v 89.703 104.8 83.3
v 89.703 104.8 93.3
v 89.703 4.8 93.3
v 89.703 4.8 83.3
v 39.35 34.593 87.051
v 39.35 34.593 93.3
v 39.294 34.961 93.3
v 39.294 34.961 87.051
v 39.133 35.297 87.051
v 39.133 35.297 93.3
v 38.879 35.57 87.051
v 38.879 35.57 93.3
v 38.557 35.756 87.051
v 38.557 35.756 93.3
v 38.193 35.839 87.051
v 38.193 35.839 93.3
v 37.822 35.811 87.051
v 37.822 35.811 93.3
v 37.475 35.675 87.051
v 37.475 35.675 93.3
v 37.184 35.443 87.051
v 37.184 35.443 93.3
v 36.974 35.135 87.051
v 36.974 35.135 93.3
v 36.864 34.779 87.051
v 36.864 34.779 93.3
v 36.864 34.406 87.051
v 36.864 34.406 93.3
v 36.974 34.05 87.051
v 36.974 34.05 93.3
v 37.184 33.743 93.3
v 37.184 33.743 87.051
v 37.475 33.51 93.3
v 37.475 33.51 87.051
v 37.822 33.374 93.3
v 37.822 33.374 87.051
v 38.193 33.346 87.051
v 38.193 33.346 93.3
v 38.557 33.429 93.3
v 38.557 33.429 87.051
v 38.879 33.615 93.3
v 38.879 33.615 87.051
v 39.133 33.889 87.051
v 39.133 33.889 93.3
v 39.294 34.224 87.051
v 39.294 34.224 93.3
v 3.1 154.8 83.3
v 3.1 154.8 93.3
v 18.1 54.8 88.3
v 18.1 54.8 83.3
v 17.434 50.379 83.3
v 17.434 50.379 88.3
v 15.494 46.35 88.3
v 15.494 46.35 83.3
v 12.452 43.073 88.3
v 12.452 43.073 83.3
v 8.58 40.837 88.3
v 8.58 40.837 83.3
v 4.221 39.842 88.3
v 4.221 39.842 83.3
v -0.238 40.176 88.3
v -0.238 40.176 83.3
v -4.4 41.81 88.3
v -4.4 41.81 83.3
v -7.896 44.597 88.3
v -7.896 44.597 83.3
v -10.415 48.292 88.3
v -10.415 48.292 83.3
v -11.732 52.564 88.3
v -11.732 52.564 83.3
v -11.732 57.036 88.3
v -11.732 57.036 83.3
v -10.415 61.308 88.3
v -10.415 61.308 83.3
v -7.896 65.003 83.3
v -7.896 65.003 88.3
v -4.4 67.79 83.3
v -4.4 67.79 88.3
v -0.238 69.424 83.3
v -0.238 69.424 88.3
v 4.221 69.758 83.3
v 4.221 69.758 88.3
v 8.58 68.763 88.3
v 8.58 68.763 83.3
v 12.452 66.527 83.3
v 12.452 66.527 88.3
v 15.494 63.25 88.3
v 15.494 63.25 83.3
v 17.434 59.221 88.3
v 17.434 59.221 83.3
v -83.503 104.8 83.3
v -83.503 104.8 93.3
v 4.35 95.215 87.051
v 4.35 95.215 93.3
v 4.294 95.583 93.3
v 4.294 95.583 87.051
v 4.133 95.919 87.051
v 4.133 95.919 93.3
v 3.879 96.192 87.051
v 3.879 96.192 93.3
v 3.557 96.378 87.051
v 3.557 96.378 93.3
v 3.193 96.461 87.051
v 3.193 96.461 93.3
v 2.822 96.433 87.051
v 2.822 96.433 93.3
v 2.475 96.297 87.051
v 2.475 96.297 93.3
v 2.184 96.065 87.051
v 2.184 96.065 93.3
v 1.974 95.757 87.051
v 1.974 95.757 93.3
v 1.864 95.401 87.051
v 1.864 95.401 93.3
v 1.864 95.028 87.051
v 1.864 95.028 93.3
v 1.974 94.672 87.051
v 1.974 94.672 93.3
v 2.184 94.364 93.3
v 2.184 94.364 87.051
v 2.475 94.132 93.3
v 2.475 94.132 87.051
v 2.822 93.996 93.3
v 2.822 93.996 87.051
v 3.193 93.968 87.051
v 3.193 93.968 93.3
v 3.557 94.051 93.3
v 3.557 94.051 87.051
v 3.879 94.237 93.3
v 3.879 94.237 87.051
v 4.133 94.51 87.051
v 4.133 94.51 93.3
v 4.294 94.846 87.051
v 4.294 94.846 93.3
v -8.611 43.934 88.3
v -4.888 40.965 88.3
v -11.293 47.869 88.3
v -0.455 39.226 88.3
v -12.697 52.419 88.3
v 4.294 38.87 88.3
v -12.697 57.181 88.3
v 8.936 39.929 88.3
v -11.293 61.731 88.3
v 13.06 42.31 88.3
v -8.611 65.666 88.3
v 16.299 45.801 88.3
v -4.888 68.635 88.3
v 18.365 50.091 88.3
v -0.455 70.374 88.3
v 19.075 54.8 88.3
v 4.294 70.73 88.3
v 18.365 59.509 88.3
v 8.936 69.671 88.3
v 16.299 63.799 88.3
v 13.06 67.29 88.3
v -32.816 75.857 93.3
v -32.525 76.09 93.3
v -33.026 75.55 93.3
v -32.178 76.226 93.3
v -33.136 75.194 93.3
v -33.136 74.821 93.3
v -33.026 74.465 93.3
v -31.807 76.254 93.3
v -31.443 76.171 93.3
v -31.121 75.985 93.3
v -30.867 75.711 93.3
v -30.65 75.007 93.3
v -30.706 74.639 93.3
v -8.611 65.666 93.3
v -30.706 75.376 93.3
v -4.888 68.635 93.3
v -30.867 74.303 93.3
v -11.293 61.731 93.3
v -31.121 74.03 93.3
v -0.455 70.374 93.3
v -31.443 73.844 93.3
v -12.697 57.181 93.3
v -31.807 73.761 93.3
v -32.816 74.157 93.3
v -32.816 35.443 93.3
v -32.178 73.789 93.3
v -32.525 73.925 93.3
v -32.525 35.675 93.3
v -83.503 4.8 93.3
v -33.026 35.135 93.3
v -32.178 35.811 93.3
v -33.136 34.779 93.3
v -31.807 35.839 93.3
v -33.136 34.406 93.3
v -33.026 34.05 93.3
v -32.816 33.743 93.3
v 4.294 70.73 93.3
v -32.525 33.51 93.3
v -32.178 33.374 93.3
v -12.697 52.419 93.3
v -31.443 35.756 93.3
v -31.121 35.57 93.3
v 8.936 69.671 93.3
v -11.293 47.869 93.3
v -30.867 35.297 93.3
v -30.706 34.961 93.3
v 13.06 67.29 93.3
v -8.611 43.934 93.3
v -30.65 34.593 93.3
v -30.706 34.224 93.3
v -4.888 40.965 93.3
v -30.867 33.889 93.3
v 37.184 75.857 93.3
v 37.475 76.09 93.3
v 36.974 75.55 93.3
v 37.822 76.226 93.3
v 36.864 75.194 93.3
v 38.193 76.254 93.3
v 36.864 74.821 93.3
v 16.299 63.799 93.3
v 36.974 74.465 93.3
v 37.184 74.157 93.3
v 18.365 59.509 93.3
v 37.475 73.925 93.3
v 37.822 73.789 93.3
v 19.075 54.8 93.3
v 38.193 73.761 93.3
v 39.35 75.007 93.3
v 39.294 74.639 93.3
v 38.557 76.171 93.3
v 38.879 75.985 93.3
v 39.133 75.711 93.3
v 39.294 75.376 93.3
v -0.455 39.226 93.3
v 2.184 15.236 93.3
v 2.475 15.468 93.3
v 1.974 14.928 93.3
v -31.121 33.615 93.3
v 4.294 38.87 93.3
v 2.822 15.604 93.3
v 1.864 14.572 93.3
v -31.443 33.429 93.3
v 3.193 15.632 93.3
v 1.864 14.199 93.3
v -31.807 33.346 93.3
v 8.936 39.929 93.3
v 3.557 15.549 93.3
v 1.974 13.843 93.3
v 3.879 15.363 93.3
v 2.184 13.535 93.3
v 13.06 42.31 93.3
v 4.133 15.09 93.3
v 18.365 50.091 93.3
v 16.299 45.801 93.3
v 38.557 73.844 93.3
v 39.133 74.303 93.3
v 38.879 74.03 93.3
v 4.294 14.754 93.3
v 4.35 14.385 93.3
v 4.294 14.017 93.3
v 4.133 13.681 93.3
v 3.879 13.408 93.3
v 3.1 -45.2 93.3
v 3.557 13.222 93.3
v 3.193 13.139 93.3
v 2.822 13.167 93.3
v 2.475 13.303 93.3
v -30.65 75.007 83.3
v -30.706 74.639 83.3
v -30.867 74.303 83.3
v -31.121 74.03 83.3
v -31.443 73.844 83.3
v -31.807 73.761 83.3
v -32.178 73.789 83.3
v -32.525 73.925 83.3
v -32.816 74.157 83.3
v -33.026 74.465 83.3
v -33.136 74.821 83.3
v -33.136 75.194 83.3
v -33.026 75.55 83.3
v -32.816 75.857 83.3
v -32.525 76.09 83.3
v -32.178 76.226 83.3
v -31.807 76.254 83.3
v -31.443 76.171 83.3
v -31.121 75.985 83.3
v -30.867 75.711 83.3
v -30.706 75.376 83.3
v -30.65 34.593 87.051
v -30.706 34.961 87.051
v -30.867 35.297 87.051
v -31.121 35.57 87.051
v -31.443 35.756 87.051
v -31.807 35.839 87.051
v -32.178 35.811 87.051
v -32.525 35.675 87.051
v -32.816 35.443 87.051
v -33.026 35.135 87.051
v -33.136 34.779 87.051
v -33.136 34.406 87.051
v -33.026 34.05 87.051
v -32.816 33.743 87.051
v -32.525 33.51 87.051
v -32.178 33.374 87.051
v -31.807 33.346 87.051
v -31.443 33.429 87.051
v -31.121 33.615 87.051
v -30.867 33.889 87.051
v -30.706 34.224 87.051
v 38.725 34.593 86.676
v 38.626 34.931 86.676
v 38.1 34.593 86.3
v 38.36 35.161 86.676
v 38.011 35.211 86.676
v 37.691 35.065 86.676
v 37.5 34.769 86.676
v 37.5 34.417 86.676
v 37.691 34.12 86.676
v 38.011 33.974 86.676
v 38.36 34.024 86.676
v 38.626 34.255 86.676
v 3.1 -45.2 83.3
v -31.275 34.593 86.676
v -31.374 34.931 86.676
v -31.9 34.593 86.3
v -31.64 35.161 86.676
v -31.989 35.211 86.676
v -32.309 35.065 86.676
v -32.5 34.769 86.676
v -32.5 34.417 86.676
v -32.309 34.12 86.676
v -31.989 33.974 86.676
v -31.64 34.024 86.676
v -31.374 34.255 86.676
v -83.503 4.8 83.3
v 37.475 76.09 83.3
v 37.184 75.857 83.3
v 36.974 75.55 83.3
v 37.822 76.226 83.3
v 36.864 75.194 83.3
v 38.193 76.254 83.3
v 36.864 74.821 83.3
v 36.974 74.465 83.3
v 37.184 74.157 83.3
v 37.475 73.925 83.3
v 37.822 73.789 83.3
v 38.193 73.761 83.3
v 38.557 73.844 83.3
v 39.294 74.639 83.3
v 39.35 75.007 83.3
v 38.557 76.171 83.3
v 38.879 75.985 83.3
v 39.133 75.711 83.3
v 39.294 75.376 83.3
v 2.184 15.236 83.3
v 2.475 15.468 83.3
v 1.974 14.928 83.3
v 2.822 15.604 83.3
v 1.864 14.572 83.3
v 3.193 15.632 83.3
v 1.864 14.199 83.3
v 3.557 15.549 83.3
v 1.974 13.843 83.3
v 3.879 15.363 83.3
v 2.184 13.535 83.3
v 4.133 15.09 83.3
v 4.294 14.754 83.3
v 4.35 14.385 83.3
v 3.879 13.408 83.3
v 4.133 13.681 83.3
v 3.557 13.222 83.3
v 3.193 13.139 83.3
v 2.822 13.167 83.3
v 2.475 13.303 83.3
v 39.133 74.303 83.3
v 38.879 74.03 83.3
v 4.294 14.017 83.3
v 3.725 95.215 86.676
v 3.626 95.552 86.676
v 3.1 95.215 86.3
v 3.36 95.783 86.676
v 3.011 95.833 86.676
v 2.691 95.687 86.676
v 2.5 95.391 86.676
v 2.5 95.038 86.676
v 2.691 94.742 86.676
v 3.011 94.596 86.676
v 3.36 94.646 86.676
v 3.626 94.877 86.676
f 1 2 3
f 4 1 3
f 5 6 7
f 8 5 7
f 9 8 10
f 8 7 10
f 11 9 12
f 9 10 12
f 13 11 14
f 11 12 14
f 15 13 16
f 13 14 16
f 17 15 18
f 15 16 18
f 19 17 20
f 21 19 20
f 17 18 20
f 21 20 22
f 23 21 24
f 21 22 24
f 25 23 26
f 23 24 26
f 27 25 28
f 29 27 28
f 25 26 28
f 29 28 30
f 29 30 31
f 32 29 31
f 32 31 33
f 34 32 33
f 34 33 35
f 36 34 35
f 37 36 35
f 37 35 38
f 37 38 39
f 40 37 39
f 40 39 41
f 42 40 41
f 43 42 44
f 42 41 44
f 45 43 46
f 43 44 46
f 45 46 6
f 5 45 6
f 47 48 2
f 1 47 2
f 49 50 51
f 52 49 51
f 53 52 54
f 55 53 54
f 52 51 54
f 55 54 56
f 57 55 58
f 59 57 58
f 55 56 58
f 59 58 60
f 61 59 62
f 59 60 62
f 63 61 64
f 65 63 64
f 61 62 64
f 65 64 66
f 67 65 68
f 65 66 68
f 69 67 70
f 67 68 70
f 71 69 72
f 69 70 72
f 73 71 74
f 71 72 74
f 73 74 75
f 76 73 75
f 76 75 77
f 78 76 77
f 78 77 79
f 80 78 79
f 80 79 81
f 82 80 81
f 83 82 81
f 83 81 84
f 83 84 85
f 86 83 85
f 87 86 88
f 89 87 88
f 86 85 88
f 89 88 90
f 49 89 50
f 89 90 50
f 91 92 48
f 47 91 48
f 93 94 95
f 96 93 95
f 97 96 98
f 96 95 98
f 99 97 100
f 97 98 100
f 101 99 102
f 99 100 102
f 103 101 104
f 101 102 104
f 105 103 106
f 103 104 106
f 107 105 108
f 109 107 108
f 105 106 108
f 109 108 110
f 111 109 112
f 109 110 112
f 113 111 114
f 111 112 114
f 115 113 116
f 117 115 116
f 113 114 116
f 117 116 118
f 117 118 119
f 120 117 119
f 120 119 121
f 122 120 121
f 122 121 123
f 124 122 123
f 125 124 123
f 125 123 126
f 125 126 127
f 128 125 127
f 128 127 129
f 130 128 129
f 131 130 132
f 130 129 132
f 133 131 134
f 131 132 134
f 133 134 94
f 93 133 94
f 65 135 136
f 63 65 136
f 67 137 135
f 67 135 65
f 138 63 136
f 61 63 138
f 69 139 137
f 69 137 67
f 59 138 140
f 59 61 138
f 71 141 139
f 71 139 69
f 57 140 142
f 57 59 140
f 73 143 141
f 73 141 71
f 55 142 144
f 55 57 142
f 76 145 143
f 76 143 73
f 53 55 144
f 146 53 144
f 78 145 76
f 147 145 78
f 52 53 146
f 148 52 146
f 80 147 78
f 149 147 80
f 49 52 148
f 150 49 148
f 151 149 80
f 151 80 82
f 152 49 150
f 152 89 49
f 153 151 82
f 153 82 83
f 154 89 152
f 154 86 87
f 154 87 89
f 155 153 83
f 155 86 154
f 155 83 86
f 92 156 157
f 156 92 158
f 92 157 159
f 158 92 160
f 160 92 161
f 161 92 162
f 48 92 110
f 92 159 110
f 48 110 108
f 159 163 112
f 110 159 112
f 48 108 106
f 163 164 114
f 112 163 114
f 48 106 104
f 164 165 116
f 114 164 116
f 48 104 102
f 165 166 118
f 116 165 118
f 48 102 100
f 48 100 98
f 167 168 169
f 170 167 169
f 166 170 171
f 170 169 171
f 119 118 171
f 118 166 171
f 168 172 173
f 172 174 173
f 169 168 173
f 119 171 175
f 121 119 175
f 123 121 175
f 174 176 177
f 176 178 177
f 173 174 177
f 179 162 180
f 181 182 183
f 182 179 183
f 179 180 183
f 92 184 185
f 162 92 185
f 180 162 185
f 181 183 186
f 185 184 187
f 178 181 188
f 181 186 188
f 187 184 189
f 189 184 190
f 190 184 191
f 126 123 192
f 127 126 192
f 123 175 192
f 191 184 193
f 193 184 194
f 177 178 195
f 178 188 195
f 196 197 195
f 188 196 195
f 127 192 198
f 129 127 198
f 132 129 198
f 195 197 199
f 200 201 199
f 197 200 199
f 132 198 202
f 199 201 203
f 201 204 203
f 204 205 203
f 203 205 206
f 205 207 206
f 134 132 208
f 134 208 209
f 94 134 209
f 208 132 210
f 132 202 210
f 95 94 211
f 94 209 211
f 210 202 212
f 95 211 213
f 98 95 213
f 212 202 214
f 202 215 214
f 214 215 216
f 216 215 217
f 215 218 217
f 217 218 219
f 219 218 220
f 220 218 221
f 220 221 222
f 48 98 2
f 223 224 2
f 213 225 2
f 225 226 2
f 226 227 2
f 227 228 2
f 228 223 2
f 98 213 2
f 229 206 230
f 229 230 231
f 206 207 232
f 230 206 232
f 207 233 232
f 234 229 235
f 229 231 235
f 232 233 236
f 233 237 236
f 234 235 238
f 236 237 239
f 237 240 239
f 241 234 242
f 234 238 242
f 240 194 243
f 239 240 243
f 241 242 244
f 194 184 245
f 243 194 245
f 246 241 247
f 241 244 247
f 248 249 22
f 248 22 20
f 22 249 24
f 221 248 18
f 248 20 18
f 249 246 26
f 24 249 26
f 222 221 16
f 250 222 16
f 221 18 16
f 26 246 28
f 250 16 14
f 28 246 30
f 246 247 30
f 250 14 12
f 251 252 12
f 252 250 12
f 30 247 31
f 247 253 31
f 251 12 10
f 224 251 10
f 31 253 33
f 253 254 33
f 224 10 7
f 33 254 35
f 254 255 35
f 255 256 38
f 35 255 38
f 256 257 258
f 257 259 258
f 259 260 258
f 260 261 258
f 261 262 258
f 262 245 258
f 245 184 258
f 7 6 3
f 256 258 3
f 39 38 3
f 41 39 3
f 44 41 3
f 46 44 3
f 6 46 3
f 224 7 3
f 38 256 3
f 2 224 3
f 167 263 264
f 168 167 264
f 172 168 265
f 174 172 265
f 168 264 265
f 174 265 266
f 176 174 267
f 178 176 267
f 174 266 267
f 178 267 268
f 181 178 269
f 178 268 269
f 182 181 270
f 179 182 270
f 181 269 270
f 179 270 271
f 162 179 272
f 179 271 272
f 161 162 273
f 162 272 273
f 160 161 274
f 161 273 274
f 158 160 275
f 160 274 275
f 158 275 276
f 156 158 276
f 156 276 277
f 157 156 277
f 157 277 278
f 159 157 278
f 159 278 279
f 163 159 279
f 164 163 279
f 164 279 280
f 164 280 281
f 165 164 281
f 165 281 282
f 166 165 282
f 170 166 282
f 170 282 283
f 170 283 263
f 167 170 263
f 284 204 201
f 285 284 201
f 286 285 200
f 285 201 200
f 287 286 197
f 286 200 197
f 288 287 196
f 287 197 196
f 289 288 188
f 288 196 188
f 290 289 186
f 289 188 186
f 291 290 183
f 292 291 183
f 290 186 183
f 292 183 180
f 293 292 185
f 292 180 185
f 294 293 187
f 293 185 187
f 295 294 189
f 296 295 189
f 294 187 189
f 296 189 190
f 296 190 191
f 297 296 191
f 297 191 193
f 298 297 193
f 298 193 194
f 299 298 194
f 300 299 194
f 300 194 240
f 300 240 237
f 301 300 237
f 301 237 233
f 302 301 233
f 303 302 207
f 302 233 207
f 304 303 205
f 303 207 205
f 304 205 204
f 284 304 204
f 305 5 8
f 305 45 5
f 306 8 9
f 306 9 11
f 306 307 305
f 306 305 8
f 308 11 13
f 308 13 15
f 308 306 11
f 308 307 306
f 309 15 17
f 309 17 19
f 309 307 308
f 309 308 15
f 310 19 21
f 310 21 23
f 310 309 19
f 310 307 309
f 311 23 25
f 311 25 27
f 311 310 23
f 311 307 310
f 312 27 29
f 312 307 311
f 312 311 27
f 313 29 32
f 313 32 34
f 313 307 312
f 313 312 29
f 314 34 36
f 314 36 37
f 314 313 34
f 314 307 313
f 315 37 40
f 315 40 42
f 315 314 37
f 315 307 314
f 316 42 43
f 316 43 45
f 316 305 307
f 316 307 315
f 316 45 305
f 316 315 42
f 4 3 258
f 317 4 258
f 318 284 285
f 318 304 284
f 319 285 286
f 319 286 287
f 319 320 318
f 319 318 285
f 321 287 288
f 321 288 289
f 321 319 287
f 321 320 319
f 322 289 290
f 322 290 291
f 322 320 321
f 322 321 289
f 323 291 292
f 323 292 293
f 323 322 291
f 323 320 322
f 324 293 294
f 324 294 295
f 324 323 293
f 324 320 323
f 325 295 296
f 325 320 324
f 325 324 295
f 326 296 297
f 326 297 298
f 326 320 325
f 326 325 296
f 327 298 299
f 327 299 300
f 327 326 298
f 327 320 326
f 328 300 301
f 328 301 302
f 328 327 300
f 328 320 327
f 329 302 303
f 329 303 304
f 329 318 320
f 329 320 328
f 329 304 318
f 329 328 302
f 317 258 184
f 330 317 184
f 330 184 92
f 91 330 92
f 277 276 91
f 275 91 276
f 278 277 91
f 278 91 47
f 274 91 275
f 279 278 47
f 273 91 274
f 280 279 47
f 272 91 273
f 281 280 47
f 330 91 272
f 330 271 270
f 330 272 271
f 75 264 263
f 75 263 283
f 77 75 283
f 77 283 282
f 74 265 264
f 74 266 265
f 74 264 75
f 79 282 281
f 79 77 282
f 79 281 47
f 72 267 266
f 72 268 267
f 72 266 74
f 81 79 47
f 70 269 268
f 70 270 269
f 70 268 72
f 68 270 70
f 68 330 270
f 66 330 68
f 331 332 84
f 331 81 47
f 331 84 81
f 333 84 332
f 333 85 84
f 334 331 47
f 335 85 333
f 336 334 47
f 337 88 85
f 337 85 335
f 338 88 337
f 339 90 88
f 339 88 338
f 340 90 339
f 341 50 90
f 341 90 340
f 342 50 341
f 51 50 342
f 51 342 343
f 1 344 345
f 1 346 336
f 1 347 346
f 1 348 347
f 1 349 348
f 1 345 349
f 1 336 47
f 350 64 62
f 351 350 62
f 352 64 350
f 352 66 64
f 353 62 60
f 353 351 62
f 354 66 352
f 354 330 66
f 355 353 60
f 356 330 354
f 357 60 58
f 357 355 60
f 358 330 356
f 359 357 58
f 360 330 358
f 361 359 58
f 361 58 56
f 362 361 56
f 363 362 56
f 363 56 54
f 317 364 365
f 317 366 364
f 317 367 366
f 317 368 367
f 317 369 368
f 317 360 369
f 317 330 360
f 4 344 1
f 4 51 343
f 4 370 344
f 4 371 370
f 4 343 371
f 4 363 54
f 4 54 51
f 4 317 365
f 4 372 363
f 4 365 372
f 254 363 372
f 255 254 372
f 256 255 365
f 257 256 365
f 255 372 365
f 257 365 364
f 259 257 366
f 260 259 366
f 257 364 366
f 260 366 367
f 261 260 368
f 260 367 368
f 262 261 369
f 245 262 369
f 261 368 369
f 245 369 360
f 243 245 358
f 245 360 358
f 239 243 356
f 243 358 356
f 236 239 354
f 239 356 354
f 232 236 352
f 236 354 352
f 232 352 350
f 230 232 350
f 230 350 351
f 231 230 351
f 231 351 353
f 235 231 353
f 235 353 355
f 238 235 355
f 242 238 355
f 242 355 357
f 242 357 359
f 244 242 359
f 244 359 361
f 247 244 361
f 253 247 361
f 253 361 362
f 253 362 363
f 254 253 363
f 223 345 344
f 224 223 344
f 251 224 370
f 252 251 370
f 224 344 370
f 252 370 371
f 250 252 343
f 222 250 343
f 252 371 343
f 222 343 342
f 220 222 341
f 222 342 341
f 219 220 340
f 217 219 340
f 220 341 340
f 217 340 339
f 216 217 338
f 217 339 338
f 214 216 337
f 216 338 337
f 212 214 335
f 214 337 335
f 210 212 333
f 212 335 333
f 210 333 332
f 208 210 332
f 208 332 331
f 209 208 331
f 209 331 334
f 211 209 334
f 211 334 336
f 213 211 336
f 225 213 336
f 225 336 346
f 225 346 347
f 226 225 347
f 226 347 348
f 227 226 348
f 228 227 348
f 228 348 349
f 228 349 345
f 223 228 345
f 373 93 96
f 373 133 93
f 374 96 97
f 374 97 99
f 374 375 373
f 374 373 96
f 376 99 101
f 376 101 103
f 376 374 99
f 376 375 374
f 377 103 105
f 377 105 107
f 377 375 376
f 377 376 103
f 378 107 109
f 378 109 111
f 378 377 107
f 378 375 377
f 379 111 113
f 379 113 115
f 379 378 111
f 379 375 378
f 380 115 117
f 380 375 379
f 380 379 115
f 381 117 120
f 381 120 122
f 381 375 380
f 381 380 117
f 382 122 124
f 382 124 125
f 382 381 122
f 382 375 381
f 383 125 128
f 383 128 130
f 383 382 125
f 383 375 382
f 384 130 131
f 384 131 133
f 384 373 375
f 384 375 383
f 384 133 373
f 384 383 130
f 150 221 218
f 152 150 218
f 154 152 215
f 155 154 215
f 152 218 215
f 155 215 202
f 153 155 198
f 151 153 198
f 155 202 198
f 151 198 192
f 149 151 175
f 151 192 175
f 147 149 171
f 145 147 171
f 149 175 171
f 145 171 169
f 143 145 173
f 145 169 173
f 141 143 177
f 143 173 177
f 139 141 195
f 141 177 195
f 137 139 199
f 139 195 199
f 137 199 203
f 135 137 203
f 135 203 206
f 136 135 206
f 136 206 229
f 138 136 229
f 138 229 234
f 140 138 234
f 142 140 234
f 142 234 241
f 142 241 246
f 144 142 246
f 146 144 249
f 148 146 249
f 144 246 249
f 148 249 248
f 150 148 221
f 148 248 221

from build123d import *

# Parameters (mm, degrees)
PAD002_DEPTH            = 10
SKETCH009_R             = 15.975
POCKET007_DEPTH         = 5
SKETCH008_R             = 15
POCKET008_DEPTH         = 5
SKETCH024_R             = 1.25
HOLE004_DEPTH           = 10.001
SKETCH066_R             = 1.25
HOLE005_DEPTH           = 6.248924
HOLE005_TIPS_R          = 1.25
BODY002_PLACEMENT_ANGLE = 180


with BuildPart() as part:
    # Sketch007 → Pad002 (new body)
    with BuildSketch(Plane.XY):
        Polygon((86.60254, 50), (0, 100), (-86.60254, 50), (-86.60254, -50), (0, -100), (86.60254, -50), align=None)
    extrude(amount=PAD002_DEPTH)

    # Sketch009 → Pocket007 (cut)
    with BuildSketch(Plane(origin=(0, 0, 0), x_dir=(1, 0, 0), z_dir=(0, 0, -1))):
        Circle(SKETCH009_R)
    extrude(amount=-POCKET007_DEPTH, mode=Mode.SUBTRACT)

    # Sketch008 → Pocket008 (cut)
    with BuildSketch(Plane.XY.offset(10)):
        Circle(SKETCH008_R)
    extrude(amount=-POCKET008_DEPTH, mode=Mode.SUBTRACT)

    # Sketch024 → Hole004 (cut, through all)
    with BuildSketch(Plane.XY.offset(10)):
        with Locations((35, -20.207259)):
            Circle(SKETCH024_R)
        with Locations((0, 40.414519)):
            Circle(SKETCH024_R)
        with Locations((-35, -20.207259)):
            Circle(SKETCH024_R)
    extrude(amount=-HOLE004_DEPTH, mode=Mode.SUBTRACT)

    # Sketch066 (on Face4 of Hole004) → Hole005 (cut)
    with BuildSketch(Plane(origin=(0, 0, 0), x_dir=(1, 0, 0), z_dir=(0, 0, -1))):
        with Locations((35, -20.207259)):
            Circle(SKETCH066_R)
        with Locations((0, 40.414519)):
            Circle(SKETCH066_R)
        with Locations((-35, -20.207259)):
            Circle(SKETCH066_R)
    extrude(amount=-HOLE005_DEPTH, mode=Mode.SUBTRACT)

    # Hole005 tips → Hole005 tip 1 section 0
    with BuildSketch(Plane(origin=(0, 0, 6.248924), x_dir=(1, 0, 0), z_dir=(0, 0, -1)), mode=Mode.PRIVATE) as hole005_tip_1_s0:
        with Locations((35, -20.207259)):
            Circle(HOLE005_TIPS_R)
    loft([hole005_tip_1_s0.sketch, Vertex(35, 20.207259, 7)], mode=Mode.SUBTRACT)

    # Hole005 tips → Hole005 tip 2 section 0
    with BuildSketch(Plane(origin=(0, 0, 6.248924), x_dir=(1, 0, 0), z_dir=(0, 0, -1)), mode=Mode.PRIVATE) as hole005_tip_2_s0:
        with Locations((0, 40.414519)):
            Circle(HOLE005_TIPS_R)
    loft([hole005_tip_2_s0.sketch, Vertex(0, -40.414519, 7)], mode=Mode.SUBTRACT)

    # Hole005 tips → Hole005 tip 3 section 0
    with BuildSketch(Plane(origin=(0, 0, 6.248924), x_dir=(1, 0, 0), z_dir=(0, 0, -1)), mode=Mode.PRIVATE) as hole005_tip_3_s0:
        with Locations((-35, -20.207259)):
            Circle(HOLE005_TIPS_R)
    loft([hole005_tip_3_s0.sketch, Vertex(-35, 20.207259, 7)], mode=Mode.SUBTRACT)


with BuildPart() as part_1:
    # Body002 placement: moved
    add(part.part.moved(Location((3.1, 54.8, 93.3))).rotate(Axis((3.1, 54.8, 93.3), (1, 0, 0)), BODY002_PLACEMENT_ANGLE))


solid = part_1.part
